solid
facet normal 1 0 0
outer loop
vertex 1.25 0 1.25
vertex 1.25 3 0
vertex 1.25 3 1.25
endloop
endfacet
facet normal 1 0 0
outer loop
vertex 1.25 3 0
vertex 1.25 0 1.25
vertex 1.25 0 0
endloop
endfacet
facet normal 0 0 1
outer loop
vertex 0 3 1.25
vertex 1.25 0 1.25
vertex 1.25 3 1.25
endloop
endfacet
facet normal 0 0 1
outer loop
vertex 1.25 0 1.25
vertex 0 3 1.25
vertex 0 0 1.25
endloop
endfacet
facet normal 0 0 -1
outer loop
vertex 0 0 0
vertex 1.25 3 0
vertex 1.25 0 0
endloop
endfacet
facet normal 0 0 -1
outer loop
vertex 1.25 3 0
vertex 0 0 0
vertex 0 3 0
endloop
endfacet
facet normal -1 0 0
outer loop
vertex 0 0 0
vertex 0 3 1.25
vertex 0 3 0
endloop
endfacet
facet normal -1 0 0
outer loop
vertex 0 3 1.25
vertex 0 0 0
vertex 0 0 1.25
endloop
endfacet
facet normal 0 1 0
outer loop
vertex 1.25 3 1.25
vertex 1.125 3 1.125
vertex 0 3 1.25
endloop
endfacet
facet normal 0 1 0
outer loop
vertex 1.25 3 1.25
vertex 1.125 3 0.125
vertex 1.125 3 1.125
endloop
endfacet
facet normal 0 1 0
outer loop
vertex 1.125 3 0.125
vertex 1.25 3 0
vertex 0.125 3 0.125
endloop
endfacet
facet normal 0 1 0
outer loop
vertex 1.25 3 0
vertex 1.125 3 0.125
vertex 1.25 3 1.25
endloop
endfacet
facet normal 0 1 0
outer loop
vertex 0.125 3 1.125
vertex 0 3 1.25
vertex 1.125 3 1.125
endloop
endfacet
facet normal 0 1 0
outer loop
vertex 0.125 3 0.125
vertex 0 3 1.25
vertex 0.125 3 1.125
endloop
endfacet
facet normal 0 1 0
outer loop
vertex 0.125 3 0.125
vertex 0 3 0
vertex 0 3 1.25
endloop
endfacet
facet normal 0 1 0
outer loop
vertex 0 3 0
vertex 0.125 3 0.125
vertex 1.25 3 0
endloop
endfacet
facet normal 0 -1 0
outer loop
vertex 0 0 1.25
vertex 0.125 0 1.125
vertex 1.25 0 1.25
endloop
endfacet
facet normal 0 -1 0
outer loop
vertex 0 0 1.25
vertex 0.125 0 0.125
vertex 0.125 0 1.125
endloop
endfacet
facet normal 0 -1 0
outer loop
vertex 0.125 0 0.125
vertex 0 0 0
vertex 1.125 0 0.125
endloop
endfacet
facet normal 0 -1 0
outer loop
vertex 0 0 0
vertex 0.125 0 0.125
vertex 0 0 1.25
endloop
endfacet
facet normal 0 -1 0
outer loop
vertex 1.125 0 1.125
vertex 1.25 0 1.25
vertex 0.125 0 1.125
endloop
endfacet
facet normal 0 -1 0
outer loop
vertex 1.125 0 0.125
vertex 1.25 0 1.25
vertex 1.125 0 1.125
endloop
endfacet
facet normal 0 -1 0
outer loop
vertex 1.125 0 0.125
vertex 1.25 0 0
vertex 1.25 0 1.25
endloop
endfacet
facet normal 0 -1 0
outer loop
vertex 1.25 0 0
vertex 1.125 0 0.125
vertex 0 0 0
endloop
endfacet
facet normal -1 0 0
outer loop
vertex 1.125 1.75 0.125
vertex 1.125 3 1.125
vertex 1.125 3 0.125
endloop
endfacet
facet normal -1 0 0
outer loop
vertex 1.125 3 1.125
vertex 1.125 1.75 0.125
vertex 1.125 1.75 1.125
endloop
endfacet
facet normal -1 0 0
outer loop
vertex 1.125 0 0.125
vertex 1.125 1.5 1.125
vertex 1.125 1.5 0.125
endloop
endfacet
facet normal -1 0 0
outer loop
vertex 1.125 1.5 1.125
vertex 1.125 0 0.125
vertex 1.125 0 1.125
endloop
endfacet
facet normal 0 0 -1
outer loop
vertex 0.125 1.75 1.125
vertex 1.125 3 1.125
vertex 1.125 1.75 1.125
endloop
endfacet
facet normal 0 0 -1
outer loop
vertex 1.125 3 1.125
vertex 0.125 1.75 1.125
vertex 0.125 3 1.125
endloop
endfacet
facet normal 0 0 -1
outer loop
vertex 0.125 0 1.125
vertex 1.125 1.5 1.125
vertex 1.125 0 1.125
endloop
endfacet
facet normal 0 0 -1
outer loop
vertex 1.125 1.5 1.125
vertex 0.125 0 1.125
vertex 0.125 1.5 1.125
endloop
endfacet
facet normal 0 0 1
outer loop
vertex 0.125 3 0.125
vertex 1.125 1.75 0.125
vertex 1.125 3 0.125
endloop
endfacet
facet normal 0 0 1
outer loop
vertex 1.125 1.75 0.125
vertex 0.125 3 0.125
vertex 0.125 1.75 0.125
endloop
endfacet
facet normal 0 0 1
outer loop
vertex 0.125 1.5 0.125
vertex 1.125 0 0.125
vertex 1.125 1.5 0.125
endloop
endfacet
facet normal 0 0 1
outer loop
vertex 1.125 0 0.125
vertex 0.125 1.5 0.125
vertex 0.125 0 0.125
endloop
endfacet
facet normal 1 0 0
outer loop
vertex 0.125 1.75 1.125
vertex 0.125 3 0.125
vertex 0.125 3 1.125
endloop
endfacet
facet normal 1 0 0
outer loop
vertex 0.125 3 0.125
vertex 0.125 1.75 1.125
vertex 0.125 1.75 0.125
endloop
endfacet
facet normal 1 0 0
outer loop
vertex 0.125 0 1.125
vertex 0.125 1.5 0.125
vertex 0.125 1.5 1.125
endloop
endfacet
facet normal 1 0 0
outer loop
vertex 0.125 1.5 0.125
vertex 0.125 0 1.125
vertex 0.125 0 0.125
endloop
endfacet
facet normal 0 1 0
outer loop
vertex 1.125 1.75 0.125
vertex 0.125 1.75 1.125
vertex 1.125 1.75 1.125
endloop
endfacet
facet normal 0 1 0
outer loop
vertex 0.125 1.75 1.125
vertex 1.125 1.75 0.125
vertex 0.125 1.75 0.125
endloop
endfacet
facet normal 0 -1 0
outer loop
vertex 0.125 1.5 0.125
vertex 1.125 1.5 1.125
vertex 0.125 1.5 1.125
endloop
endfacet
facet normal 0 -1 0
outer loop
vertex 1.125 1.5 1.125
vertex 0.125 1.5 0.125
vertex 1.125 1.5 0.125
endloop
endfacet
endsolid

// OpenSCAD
$fn = 10;
module collar(){
union(){
translate([0.125,1.5,0.125])
	cube([1,0.25,1]);
difference(){
cube([1.25,3,1.25]);
translate([0.125,0.0,0.125])
	cube([1,3,1]);
}
}
}
collar();
